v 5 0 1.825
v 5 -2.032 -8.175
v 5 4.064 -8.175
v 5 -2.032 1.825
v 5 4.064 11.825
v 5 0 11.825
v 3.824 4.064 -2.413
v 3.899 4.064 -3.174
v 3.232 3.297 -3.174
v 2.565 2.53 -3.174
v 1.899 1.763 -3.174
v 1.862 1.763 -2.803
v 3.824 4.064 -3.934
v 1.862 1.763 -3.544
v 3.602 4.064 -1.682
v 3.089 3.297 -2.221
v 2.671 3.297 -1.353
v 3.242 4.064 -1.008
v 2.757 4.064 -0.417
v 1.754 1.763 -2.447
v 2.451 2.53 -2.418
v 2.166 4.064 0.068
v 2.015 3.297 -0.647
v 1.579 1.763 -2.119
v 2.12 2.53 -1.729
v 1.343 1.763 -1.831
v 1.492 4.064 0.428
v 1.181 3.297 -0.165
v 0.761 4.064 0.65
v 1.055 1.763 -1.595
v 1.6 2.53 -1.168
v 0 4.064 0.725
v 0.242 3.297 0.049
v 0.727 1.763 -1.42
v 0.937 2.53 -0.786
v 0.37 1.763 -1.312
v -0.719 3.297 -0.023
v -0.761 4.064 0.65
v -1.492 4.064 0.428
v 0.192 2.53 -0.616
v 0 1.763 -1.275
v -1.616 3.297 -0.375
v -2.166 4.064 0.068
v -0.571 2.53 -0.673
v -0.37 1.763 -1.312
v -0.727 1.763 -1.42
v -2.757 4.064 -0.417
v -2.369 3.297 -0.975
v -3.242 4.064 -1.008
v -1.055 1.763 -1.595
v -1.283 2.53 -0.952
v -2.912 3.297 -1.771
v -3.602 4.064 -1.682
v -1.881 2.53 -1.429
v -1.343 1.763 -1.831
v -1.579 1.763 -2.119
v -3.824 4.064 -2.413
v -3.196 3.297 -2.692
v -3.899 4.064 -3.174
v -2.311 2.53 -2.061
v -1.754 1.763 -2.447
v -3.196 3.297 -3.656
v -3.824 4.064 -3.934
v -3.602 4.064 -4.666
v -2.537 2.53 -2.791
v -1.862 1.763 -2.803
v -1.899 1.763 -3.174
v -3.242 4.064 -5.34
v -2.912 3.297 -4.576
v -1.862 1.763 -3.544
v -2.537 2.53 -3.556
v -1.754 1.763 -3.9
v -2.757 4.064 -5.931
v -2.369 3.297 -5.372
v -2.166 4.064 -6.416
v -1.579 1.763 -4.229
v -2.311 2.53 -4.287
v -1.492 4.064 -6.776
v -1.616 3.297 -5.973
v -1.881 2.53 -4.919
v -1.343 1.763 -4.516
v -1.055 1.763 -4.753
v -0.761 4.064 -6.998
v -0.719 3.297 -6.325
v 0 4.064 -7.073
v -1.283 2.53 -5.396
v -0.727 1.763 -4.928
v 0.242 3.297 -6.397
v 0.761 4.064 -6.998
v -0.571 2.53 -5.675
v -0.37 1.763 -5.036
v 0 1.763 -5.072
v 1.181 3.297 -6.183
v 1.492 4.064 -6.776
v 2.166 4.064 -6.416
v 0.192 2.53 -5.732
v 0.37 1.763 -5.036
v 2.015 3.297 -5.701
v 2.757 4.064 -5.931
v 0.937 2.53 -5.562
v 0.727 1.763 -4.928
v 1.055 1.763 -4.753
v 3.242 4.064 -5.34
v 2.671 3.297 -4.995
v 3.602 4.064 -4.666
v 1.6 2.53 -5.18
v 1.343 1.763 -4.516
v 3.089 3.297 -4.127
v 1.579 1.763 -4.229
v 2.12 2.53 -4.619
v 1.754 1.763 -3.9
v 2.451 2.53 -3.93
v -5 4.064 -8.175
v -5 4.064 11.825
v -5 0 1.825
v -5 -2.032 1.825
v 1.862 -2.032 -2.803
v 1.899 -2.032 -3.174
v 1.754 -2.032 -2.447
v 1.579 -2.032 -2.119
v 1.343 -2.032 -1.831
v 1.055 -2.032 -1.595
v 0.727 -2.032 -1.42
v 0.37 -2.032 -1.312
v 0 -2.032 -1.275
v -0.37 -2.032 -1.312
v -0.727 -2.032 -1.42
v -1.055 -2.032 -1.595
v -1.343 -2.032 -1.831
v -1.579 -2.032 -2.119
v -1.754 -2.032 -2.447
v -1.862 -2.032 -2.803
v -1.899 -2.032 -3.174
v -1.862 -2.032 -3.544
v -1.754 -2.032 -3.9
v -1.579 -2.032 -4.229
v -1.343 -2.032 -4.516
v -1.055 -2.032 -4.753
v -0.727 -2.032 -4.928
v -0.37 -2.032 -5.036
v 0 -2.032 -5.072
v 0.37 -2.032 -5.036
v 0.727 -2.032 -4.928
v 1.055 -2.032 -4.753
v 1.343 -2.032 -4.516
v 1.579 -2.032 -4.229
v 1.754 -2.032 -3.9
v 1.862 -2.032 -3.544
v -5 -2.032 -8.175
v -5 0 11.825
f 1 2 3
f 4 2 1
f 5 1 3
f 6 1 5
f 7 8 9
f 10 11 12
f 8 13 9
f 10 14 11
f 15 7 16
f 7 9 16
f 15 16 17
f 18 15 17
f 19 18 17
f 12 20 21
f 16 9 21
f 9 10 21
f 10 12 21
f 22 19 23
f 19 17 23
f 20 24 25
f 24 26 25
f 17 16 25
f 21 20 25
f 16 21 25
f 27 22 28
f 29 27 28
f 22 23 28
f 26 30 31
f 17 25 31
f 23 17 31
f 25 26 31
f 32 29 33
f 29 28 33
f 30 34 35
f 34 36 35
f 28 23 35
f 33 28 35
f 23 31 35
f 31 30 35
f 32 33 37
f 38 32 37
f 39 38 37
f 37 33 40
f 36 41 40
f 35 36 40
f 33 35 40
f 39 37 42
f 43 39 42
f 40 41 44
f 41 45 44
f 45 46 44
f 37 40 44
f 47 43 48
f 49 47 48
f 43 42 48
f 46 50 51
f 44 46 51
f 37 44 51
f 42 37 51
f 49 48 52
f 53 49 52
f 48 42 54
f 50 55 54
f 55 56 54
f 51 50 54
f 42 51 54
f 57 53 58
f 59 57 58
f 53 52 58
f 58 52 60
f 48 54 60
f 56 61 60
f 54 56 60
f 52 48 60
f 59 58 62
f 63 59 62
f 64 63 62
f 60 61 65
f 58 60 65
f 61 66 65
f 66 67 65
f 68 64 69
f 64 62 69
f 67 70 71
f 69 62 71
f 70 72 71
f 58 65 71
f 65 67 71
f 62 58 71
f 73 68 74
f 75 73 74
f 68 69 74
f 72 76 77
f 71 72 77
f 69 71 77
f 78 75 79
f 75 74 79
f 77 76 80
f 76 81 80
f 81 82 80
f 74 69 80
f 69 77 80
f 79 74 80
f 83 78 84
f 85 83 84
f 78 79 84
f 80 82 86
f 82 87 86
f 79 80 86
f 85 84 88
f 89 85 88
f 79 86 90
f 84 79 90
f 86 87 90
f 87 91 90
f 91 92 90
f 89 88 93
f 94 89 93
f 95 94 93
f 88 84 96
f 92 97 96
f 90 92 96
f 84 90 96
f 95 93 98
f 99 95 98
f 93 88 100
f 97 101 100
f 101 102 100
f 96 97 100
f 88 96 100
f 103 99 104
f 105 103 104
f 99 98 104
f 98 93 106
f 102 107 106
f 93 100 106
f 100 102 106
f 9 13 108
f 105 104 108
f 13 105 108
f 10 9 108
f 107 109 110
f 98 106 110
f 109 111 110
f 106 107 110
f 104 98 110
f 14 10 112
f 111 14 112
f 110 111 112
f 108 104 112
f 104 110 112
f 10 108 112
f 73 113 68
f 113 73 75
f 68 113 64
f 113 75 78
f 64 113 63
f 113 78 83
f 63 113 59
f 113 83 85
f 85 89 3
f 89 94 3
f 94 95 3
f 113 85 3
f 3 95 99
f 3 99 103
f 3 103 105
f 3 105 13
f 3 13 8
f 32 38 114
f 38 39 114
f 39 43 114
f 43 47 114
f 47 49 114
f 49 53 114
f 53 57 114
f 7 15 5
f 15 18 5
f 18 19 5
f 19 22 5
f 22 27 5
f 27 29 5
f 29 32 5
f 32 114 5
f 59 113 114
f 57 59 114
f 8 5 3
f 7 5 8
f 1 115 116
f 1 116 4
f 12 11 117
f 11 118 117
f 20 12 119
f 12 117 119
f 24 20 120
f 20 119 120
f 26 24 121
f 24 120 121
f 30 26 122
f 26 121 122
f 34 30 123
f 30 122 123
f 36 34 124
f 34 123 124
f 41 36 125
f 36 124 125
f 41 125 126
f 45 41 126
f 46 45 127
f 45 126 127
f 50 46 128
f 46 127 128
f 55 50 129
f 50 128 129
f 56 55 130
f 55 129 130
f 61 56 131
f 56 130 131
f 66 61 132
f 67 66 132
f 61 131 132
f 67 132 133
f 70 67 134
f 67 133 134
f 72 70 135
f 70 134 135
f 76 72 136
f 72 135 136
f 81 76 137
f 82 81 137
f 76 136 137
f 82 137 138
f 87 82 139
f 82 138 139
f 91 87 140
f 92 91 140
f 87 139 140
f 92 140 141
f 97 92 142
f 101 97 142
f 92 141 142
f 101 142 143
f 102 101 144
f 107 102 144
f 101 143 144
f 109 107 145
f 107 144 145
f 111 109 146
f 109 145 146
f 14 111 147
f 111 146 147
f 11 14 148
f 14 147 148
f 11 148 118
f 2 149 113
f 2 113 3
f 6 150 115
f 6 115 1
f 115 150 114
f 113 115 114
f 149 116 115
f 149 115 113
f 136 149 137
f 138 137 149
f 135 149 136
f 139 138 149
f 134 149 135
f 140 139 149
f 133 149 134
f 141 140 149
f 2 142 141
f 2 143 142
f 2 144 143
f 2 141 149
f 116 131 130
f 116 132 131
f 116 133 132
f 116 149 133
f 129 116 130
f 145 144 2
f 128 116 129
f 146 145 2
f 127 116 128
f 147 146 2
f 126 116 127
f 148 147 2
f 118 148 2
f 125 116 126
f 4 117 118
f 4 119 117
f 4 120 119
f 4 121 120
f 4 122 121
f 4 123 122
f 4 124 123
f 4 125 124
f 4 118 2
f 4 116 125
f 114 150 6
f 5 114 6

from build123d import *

# Parameters (mm, degrees)
F0_W           = 10
F0_H           = 10
F1_DEPTH       = 2.032
F2_DEPTH       = 4.064
F4_D           = 3.7973
F4_CSINK_D     = 7.7978
F4_CSINK_ANGLE = 82


with BuildPart() as f1:
    # F0 (on Front) → F1 (new body)
    with BuildSketch(Plane.XZ):
        with Locations((0, -3.175)):
            Rectangle(F0_W, F0_H)
    extrude(amount=F1_DEPTH)

    # F0 (on Front) → F2 (join)
    with BuildSketch(Plane.XZ):
        with Locations((0, 6.825)):
            Rectangle(F0_W, F0_H)
        with Locations((0, -3.175)):
            Rectangle(F0_W, F0_H)
    extrude(amount=-F2_DEPTH)

    # F4 (through all)
    with Locations(Plane(origin=(0, 4.064, 0), x_dir=(-1, 0, 0), z_dir=(0, 1, 0))):
        with Locations((0, -3.1738367397)):
            CounterSinkHole(F4_D / 2, F4_CSINK_D / 2, counter_sink_angle=F4_CSINK_ANGLE)


solid = f1.part
